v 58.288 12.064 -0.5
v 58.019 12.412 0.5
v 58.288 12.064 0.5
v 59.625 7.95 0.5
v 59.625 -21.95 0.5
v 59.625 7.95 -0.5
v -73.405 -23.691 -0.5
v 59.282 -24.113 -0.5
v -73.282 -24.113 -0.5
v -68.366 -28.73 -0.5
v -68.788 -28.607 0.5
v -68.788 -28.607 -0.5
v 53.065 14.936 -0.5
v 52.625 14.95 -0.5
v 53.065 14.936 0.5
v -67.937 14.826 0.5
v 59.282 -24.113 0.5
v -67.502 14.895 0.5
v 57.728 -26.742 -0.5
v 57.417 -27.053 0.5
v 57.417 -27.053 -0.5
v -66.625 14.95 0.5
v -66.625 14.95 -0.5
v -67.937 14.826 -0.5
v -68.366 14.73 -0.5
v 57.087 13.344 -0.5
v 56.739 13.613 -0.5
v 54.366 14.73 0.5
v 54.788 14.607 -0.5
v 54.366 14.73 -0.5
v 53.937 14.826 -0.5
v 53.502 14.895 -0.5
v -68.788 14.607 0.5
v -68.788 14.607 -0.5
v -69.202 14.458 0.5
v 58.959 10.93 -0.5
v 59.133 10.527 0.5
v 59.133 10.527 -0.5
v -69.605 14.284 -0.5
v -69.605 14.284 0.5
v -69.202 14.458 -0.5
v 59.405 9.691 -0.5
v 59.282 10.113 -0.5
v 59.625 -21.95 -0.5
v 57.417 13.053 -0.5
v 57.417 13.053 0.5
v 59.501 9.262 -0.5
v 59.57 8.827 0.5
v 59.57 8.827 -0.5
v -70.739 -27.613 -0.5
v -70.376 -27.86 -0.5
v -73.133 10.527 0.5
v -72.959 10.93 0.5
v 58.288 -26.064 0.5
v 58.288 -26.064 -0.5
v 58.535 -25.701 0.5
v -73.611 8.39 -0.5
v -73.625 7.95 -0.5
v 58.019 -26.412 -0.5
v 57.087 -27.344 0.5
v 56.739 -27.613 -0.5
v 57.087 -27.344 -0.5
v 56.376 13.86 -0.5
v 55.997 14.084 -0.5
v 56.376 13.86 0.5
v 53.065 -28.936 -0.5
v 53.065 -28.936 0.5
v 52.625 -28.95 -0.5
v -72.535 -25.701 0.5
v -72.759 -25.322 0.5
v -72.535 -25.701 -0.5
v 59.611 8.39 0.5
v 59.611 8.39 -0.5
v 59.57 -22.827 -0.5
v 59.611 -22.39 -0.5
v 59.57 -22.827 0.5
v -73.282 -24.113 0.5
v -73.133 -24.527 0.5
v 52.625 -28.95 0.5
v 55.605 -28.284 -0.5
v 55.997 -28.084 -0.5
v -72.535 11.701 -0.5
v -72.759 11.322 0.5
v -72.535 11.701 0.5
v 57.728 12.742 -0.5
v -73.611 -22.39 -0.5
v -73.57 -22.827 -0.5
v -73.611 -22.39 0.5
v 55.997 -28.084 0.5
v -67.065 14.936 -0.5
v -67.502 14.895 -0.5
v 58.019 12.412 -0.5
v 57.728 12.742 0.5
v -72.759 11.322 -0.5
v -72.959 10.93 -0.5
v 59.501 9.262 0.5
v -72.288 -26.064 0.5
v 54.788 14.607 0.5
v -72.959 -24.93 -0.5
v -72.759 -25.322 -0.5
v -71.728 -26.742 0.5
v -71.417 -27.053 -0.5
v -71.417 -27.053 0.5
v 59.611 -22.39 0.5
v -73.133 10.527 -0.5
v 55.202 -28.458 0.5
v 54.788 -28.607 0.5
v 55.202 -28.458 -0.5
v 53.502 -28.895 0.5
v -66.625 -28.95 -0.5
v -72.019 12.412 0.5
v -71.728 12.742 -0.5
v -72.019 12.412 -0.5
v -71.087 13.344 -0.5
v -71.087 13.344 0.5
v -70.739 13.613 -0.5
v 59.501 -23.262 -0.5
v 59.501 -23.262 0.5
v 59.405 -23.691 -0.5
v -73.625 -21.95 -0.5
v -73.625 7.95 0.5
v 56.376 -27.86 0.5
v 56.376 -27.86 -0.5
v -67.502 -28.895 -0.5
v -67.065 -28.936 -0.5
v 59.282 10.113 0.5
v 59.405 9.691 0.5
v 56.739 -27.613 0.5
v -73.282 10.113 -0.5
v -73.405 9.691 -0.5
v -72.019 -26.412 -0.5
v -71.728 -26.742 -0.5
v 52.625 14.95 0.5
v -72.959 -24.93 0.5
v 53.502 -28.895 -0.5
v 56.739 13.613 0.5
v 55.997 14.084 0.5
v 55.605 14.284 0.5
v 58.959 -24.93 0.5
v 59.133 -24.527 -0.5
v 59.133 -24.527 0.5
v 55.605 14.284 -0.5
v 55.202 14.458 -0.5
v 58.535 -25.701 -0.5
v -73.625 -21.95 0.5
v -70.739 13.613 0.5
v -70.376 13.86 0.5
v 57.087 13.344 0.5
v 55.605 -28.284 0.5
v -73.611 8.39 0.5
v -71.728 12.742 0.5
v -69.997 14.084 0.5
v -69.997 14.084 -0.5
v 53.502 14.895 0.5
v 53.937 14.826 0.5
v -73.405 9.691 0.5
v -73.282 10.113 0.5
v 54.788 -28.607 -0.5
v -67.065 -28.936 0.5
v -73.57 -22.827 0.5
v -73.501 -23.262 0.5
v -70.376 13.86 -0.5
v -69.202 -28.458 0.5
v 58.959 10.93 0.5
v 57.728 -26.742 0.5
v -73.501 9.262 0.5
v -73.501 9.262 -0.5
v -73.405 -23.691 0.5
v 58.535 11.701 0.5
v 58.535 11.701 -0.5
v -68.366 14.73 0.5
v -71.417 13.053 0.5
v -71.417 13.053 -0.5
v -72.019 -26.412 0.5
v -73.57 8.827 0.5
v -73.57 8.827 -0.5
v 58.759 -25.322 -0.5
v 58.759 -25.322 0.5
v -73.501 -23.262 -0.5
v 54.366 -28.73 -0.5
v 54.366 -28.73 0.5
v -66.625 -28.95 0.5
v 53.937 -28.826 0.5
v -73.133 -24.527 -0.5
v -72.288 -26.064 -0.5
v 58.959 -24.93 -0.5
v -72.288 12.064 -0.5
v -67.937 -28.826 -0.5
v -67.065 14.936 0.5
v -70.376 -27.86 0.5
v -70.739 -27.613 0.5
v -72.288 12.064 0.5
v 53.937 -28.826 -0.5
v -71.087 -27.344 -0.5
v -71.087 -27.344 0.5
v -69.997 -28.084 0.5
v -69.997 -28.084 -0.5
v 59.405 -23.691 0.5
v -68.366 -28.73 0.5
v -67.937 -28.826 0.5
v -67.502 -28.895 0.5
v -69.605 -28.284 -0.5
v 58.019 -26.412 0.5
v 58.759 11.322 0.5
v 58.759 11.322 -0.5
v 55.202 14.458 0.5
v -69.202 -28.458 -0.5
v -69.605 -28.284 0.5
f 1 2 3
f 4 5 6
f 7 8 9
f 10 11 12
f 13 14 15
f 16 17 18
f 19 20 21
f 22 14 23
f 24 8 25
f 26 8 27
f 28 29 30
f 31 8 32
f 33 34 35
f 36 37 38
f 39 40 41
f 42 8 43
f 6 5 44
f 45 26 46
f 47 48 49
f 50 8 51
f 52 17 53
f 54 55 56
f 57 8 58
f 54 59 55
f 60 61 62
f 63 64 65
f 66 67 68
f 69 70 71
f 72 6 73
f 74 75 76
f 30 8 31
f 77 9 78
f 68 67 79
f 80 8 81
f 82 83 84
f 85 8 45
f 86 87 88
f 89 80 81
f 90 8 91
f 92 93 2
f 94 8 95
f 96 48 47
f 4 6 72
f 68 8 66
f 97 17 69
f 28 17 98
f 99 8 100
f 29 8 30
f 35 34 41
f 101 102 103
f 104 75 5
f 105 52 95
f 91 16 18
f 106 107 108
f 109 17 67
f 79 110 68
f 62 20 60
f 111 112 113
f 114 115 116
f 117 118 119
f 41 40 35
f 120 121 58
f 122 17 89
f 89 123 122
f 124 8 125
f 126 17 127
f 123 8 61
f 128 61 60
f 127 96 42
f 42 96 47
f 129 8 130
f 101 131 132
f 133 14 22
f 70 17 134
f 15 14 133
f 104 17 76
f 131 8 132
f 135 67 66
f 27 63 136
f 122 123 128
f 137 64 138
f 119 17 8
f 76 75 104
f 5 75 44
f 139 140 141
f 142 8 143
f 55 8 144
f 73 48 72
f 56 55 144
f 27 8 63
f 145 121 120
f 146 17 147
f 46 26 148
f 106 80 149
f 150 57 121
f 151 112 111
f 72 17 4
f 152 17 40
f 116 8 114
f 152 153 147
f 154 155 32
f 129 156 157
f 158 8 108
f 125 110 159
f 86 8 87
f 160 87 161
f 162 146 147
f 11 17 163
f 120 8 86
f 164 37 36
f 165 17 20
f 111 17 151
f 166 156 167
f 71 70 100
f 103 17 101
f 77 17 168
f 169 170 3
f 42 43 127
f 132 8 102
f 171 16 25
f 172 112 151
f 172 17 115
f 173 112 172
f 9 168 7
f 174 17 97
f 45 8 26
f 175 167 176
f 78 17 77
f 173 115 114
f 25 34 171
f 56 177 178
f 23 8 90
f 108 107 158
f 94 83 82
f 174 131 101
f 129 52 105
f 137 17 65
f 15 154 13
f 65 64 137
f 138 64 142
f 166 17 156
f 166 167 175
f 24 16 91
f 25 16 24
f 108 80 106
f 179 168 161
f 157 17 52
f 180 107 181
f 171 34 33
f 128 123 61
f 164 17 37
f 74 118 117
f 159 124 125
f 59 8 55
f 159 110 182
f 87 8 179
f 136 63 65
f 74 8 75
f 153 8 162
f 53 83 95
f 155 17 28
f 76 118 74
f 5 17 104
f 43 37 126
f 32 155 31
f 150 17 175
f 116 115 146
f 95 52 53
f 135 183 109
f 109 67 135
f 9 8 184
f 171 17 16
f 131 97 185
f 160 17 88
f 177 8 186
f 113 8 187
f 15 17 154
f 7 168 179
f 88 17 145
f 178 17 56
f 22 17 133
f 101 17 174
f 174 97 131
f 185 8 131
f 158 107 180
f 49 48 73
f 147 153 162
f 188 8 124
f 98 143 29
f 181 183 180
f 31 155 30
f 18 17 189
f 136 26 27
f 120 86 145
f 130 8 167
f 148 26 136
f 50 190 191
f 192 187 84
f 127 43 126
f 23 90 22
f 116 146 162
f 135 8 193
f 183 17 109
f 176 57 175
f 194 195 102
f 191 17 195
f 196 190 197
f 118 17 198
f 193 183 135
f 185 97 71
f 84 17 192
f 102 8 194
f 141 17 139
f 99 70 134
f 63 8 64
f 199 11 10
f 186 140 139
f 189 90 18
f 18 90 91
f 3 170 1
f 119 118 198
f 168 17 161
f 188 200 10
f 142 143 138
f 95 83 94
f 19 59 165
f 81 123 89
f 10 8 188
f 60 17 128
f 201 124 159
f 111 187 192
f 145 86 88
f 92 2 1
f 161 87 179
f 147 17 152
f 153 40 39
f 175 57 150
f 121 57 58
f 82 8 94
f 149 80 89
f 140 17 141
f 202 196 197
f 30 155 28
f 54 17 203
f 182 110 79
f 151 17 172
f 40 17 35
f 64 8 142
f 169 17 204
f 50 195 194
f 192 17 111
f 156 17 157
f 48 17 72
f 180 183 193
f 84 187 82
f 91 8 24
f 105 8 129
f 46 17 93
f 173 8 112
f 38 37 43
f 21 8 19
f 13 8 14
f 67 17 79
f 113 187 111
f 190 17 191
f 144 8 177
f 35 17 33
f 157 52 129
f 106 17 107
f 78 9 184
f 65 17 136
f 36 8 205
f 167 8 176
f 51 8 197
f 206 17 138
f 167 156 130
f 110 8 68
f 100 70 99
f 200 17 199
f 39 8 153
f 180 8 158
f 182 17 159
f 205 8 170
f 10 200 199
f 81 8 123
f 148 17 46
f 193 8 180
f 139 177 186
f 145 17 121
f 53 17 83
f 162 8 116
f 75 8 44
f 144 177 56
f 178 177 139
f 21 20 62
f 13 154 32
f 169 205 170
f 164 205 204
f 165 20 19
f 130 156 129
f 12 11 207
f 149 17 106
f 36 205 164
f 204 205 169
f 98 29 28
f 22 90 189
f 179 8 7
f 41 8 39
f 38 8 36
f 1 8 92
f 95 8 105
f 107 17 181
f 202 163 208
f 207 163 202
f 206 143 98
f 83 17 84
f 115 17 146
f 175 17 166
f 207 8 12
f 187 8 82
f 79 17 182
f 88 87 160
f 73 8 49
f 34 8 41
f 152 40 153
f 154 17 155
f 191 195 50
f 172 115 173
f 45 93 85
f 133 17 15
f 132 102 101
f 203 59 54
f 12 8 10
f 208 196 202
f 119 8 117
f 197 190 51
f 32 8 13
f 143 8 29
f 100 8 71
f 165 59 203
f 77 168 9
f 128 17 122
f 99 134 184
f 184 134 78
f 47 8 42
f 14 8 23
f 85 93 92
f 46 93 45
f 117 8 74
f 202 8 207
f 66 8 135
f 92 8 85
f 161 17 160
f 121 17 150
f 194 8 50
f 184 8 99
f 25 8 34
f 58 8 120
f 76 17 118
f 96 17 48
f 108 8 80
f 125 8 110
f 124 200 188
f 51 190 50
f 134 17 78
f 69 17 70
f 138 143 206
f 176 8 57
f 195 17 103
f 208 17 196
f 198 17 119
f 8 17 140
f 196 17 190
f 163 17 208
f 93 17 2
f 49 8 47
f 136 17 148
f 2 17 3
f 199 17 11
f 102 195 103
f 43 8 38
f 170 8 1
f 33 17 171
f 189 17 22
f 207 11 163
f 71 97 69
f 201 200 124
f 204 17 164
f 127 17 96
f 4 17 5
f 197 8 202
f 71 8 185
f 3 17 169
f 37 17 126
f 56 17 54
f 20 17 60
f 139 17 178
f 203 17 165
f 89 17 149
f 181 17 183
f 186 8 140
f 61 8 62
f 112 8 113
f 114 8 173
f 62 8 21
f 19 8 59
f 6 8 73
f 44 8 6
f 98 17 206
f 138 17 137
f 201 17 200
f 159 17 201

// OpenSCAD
// Create a speedometer housing for the Barchetta
// replaces light fitting which is 
// 29.9mm wide 119.25 mm long with curved ends  with radius of 7mm?
base_corner_radius = 7;
base_total_length = 119.25;
base_total_width = 29.9;
base_height = 1;
module draw_base()
{
    // Use hull to create the base
    hull()
    {
        translate([(base_total_length/2)-base_corner_radius, (base_total_width/2)-base_corner_radius, 0])
            cylinder(h=base_height, r = base_corner_radius, center=true);
        translate([-1*(base_total_length/2)-base_corner_radius, (base_total_width/2)-base_corner_radius, 0])
            cylinder(h=base_height, r = base_corner_radius, center=true);
        translate([(base_total_length/2)-base_corner_radius, -1*(base_total_width/2)-base_corner_radius, 0])
            cylinder(h=base_height, r = base_corner_radius, center=true);
        translate([-1*(base_total_length/2)-base_corner_radius, -1*(base_total_width/2)-base_corner_radius, 0])
            cylinder(h=base_height, r = base_corner_radius, center=true);
    }
}
$fn=100;
draw_base();
